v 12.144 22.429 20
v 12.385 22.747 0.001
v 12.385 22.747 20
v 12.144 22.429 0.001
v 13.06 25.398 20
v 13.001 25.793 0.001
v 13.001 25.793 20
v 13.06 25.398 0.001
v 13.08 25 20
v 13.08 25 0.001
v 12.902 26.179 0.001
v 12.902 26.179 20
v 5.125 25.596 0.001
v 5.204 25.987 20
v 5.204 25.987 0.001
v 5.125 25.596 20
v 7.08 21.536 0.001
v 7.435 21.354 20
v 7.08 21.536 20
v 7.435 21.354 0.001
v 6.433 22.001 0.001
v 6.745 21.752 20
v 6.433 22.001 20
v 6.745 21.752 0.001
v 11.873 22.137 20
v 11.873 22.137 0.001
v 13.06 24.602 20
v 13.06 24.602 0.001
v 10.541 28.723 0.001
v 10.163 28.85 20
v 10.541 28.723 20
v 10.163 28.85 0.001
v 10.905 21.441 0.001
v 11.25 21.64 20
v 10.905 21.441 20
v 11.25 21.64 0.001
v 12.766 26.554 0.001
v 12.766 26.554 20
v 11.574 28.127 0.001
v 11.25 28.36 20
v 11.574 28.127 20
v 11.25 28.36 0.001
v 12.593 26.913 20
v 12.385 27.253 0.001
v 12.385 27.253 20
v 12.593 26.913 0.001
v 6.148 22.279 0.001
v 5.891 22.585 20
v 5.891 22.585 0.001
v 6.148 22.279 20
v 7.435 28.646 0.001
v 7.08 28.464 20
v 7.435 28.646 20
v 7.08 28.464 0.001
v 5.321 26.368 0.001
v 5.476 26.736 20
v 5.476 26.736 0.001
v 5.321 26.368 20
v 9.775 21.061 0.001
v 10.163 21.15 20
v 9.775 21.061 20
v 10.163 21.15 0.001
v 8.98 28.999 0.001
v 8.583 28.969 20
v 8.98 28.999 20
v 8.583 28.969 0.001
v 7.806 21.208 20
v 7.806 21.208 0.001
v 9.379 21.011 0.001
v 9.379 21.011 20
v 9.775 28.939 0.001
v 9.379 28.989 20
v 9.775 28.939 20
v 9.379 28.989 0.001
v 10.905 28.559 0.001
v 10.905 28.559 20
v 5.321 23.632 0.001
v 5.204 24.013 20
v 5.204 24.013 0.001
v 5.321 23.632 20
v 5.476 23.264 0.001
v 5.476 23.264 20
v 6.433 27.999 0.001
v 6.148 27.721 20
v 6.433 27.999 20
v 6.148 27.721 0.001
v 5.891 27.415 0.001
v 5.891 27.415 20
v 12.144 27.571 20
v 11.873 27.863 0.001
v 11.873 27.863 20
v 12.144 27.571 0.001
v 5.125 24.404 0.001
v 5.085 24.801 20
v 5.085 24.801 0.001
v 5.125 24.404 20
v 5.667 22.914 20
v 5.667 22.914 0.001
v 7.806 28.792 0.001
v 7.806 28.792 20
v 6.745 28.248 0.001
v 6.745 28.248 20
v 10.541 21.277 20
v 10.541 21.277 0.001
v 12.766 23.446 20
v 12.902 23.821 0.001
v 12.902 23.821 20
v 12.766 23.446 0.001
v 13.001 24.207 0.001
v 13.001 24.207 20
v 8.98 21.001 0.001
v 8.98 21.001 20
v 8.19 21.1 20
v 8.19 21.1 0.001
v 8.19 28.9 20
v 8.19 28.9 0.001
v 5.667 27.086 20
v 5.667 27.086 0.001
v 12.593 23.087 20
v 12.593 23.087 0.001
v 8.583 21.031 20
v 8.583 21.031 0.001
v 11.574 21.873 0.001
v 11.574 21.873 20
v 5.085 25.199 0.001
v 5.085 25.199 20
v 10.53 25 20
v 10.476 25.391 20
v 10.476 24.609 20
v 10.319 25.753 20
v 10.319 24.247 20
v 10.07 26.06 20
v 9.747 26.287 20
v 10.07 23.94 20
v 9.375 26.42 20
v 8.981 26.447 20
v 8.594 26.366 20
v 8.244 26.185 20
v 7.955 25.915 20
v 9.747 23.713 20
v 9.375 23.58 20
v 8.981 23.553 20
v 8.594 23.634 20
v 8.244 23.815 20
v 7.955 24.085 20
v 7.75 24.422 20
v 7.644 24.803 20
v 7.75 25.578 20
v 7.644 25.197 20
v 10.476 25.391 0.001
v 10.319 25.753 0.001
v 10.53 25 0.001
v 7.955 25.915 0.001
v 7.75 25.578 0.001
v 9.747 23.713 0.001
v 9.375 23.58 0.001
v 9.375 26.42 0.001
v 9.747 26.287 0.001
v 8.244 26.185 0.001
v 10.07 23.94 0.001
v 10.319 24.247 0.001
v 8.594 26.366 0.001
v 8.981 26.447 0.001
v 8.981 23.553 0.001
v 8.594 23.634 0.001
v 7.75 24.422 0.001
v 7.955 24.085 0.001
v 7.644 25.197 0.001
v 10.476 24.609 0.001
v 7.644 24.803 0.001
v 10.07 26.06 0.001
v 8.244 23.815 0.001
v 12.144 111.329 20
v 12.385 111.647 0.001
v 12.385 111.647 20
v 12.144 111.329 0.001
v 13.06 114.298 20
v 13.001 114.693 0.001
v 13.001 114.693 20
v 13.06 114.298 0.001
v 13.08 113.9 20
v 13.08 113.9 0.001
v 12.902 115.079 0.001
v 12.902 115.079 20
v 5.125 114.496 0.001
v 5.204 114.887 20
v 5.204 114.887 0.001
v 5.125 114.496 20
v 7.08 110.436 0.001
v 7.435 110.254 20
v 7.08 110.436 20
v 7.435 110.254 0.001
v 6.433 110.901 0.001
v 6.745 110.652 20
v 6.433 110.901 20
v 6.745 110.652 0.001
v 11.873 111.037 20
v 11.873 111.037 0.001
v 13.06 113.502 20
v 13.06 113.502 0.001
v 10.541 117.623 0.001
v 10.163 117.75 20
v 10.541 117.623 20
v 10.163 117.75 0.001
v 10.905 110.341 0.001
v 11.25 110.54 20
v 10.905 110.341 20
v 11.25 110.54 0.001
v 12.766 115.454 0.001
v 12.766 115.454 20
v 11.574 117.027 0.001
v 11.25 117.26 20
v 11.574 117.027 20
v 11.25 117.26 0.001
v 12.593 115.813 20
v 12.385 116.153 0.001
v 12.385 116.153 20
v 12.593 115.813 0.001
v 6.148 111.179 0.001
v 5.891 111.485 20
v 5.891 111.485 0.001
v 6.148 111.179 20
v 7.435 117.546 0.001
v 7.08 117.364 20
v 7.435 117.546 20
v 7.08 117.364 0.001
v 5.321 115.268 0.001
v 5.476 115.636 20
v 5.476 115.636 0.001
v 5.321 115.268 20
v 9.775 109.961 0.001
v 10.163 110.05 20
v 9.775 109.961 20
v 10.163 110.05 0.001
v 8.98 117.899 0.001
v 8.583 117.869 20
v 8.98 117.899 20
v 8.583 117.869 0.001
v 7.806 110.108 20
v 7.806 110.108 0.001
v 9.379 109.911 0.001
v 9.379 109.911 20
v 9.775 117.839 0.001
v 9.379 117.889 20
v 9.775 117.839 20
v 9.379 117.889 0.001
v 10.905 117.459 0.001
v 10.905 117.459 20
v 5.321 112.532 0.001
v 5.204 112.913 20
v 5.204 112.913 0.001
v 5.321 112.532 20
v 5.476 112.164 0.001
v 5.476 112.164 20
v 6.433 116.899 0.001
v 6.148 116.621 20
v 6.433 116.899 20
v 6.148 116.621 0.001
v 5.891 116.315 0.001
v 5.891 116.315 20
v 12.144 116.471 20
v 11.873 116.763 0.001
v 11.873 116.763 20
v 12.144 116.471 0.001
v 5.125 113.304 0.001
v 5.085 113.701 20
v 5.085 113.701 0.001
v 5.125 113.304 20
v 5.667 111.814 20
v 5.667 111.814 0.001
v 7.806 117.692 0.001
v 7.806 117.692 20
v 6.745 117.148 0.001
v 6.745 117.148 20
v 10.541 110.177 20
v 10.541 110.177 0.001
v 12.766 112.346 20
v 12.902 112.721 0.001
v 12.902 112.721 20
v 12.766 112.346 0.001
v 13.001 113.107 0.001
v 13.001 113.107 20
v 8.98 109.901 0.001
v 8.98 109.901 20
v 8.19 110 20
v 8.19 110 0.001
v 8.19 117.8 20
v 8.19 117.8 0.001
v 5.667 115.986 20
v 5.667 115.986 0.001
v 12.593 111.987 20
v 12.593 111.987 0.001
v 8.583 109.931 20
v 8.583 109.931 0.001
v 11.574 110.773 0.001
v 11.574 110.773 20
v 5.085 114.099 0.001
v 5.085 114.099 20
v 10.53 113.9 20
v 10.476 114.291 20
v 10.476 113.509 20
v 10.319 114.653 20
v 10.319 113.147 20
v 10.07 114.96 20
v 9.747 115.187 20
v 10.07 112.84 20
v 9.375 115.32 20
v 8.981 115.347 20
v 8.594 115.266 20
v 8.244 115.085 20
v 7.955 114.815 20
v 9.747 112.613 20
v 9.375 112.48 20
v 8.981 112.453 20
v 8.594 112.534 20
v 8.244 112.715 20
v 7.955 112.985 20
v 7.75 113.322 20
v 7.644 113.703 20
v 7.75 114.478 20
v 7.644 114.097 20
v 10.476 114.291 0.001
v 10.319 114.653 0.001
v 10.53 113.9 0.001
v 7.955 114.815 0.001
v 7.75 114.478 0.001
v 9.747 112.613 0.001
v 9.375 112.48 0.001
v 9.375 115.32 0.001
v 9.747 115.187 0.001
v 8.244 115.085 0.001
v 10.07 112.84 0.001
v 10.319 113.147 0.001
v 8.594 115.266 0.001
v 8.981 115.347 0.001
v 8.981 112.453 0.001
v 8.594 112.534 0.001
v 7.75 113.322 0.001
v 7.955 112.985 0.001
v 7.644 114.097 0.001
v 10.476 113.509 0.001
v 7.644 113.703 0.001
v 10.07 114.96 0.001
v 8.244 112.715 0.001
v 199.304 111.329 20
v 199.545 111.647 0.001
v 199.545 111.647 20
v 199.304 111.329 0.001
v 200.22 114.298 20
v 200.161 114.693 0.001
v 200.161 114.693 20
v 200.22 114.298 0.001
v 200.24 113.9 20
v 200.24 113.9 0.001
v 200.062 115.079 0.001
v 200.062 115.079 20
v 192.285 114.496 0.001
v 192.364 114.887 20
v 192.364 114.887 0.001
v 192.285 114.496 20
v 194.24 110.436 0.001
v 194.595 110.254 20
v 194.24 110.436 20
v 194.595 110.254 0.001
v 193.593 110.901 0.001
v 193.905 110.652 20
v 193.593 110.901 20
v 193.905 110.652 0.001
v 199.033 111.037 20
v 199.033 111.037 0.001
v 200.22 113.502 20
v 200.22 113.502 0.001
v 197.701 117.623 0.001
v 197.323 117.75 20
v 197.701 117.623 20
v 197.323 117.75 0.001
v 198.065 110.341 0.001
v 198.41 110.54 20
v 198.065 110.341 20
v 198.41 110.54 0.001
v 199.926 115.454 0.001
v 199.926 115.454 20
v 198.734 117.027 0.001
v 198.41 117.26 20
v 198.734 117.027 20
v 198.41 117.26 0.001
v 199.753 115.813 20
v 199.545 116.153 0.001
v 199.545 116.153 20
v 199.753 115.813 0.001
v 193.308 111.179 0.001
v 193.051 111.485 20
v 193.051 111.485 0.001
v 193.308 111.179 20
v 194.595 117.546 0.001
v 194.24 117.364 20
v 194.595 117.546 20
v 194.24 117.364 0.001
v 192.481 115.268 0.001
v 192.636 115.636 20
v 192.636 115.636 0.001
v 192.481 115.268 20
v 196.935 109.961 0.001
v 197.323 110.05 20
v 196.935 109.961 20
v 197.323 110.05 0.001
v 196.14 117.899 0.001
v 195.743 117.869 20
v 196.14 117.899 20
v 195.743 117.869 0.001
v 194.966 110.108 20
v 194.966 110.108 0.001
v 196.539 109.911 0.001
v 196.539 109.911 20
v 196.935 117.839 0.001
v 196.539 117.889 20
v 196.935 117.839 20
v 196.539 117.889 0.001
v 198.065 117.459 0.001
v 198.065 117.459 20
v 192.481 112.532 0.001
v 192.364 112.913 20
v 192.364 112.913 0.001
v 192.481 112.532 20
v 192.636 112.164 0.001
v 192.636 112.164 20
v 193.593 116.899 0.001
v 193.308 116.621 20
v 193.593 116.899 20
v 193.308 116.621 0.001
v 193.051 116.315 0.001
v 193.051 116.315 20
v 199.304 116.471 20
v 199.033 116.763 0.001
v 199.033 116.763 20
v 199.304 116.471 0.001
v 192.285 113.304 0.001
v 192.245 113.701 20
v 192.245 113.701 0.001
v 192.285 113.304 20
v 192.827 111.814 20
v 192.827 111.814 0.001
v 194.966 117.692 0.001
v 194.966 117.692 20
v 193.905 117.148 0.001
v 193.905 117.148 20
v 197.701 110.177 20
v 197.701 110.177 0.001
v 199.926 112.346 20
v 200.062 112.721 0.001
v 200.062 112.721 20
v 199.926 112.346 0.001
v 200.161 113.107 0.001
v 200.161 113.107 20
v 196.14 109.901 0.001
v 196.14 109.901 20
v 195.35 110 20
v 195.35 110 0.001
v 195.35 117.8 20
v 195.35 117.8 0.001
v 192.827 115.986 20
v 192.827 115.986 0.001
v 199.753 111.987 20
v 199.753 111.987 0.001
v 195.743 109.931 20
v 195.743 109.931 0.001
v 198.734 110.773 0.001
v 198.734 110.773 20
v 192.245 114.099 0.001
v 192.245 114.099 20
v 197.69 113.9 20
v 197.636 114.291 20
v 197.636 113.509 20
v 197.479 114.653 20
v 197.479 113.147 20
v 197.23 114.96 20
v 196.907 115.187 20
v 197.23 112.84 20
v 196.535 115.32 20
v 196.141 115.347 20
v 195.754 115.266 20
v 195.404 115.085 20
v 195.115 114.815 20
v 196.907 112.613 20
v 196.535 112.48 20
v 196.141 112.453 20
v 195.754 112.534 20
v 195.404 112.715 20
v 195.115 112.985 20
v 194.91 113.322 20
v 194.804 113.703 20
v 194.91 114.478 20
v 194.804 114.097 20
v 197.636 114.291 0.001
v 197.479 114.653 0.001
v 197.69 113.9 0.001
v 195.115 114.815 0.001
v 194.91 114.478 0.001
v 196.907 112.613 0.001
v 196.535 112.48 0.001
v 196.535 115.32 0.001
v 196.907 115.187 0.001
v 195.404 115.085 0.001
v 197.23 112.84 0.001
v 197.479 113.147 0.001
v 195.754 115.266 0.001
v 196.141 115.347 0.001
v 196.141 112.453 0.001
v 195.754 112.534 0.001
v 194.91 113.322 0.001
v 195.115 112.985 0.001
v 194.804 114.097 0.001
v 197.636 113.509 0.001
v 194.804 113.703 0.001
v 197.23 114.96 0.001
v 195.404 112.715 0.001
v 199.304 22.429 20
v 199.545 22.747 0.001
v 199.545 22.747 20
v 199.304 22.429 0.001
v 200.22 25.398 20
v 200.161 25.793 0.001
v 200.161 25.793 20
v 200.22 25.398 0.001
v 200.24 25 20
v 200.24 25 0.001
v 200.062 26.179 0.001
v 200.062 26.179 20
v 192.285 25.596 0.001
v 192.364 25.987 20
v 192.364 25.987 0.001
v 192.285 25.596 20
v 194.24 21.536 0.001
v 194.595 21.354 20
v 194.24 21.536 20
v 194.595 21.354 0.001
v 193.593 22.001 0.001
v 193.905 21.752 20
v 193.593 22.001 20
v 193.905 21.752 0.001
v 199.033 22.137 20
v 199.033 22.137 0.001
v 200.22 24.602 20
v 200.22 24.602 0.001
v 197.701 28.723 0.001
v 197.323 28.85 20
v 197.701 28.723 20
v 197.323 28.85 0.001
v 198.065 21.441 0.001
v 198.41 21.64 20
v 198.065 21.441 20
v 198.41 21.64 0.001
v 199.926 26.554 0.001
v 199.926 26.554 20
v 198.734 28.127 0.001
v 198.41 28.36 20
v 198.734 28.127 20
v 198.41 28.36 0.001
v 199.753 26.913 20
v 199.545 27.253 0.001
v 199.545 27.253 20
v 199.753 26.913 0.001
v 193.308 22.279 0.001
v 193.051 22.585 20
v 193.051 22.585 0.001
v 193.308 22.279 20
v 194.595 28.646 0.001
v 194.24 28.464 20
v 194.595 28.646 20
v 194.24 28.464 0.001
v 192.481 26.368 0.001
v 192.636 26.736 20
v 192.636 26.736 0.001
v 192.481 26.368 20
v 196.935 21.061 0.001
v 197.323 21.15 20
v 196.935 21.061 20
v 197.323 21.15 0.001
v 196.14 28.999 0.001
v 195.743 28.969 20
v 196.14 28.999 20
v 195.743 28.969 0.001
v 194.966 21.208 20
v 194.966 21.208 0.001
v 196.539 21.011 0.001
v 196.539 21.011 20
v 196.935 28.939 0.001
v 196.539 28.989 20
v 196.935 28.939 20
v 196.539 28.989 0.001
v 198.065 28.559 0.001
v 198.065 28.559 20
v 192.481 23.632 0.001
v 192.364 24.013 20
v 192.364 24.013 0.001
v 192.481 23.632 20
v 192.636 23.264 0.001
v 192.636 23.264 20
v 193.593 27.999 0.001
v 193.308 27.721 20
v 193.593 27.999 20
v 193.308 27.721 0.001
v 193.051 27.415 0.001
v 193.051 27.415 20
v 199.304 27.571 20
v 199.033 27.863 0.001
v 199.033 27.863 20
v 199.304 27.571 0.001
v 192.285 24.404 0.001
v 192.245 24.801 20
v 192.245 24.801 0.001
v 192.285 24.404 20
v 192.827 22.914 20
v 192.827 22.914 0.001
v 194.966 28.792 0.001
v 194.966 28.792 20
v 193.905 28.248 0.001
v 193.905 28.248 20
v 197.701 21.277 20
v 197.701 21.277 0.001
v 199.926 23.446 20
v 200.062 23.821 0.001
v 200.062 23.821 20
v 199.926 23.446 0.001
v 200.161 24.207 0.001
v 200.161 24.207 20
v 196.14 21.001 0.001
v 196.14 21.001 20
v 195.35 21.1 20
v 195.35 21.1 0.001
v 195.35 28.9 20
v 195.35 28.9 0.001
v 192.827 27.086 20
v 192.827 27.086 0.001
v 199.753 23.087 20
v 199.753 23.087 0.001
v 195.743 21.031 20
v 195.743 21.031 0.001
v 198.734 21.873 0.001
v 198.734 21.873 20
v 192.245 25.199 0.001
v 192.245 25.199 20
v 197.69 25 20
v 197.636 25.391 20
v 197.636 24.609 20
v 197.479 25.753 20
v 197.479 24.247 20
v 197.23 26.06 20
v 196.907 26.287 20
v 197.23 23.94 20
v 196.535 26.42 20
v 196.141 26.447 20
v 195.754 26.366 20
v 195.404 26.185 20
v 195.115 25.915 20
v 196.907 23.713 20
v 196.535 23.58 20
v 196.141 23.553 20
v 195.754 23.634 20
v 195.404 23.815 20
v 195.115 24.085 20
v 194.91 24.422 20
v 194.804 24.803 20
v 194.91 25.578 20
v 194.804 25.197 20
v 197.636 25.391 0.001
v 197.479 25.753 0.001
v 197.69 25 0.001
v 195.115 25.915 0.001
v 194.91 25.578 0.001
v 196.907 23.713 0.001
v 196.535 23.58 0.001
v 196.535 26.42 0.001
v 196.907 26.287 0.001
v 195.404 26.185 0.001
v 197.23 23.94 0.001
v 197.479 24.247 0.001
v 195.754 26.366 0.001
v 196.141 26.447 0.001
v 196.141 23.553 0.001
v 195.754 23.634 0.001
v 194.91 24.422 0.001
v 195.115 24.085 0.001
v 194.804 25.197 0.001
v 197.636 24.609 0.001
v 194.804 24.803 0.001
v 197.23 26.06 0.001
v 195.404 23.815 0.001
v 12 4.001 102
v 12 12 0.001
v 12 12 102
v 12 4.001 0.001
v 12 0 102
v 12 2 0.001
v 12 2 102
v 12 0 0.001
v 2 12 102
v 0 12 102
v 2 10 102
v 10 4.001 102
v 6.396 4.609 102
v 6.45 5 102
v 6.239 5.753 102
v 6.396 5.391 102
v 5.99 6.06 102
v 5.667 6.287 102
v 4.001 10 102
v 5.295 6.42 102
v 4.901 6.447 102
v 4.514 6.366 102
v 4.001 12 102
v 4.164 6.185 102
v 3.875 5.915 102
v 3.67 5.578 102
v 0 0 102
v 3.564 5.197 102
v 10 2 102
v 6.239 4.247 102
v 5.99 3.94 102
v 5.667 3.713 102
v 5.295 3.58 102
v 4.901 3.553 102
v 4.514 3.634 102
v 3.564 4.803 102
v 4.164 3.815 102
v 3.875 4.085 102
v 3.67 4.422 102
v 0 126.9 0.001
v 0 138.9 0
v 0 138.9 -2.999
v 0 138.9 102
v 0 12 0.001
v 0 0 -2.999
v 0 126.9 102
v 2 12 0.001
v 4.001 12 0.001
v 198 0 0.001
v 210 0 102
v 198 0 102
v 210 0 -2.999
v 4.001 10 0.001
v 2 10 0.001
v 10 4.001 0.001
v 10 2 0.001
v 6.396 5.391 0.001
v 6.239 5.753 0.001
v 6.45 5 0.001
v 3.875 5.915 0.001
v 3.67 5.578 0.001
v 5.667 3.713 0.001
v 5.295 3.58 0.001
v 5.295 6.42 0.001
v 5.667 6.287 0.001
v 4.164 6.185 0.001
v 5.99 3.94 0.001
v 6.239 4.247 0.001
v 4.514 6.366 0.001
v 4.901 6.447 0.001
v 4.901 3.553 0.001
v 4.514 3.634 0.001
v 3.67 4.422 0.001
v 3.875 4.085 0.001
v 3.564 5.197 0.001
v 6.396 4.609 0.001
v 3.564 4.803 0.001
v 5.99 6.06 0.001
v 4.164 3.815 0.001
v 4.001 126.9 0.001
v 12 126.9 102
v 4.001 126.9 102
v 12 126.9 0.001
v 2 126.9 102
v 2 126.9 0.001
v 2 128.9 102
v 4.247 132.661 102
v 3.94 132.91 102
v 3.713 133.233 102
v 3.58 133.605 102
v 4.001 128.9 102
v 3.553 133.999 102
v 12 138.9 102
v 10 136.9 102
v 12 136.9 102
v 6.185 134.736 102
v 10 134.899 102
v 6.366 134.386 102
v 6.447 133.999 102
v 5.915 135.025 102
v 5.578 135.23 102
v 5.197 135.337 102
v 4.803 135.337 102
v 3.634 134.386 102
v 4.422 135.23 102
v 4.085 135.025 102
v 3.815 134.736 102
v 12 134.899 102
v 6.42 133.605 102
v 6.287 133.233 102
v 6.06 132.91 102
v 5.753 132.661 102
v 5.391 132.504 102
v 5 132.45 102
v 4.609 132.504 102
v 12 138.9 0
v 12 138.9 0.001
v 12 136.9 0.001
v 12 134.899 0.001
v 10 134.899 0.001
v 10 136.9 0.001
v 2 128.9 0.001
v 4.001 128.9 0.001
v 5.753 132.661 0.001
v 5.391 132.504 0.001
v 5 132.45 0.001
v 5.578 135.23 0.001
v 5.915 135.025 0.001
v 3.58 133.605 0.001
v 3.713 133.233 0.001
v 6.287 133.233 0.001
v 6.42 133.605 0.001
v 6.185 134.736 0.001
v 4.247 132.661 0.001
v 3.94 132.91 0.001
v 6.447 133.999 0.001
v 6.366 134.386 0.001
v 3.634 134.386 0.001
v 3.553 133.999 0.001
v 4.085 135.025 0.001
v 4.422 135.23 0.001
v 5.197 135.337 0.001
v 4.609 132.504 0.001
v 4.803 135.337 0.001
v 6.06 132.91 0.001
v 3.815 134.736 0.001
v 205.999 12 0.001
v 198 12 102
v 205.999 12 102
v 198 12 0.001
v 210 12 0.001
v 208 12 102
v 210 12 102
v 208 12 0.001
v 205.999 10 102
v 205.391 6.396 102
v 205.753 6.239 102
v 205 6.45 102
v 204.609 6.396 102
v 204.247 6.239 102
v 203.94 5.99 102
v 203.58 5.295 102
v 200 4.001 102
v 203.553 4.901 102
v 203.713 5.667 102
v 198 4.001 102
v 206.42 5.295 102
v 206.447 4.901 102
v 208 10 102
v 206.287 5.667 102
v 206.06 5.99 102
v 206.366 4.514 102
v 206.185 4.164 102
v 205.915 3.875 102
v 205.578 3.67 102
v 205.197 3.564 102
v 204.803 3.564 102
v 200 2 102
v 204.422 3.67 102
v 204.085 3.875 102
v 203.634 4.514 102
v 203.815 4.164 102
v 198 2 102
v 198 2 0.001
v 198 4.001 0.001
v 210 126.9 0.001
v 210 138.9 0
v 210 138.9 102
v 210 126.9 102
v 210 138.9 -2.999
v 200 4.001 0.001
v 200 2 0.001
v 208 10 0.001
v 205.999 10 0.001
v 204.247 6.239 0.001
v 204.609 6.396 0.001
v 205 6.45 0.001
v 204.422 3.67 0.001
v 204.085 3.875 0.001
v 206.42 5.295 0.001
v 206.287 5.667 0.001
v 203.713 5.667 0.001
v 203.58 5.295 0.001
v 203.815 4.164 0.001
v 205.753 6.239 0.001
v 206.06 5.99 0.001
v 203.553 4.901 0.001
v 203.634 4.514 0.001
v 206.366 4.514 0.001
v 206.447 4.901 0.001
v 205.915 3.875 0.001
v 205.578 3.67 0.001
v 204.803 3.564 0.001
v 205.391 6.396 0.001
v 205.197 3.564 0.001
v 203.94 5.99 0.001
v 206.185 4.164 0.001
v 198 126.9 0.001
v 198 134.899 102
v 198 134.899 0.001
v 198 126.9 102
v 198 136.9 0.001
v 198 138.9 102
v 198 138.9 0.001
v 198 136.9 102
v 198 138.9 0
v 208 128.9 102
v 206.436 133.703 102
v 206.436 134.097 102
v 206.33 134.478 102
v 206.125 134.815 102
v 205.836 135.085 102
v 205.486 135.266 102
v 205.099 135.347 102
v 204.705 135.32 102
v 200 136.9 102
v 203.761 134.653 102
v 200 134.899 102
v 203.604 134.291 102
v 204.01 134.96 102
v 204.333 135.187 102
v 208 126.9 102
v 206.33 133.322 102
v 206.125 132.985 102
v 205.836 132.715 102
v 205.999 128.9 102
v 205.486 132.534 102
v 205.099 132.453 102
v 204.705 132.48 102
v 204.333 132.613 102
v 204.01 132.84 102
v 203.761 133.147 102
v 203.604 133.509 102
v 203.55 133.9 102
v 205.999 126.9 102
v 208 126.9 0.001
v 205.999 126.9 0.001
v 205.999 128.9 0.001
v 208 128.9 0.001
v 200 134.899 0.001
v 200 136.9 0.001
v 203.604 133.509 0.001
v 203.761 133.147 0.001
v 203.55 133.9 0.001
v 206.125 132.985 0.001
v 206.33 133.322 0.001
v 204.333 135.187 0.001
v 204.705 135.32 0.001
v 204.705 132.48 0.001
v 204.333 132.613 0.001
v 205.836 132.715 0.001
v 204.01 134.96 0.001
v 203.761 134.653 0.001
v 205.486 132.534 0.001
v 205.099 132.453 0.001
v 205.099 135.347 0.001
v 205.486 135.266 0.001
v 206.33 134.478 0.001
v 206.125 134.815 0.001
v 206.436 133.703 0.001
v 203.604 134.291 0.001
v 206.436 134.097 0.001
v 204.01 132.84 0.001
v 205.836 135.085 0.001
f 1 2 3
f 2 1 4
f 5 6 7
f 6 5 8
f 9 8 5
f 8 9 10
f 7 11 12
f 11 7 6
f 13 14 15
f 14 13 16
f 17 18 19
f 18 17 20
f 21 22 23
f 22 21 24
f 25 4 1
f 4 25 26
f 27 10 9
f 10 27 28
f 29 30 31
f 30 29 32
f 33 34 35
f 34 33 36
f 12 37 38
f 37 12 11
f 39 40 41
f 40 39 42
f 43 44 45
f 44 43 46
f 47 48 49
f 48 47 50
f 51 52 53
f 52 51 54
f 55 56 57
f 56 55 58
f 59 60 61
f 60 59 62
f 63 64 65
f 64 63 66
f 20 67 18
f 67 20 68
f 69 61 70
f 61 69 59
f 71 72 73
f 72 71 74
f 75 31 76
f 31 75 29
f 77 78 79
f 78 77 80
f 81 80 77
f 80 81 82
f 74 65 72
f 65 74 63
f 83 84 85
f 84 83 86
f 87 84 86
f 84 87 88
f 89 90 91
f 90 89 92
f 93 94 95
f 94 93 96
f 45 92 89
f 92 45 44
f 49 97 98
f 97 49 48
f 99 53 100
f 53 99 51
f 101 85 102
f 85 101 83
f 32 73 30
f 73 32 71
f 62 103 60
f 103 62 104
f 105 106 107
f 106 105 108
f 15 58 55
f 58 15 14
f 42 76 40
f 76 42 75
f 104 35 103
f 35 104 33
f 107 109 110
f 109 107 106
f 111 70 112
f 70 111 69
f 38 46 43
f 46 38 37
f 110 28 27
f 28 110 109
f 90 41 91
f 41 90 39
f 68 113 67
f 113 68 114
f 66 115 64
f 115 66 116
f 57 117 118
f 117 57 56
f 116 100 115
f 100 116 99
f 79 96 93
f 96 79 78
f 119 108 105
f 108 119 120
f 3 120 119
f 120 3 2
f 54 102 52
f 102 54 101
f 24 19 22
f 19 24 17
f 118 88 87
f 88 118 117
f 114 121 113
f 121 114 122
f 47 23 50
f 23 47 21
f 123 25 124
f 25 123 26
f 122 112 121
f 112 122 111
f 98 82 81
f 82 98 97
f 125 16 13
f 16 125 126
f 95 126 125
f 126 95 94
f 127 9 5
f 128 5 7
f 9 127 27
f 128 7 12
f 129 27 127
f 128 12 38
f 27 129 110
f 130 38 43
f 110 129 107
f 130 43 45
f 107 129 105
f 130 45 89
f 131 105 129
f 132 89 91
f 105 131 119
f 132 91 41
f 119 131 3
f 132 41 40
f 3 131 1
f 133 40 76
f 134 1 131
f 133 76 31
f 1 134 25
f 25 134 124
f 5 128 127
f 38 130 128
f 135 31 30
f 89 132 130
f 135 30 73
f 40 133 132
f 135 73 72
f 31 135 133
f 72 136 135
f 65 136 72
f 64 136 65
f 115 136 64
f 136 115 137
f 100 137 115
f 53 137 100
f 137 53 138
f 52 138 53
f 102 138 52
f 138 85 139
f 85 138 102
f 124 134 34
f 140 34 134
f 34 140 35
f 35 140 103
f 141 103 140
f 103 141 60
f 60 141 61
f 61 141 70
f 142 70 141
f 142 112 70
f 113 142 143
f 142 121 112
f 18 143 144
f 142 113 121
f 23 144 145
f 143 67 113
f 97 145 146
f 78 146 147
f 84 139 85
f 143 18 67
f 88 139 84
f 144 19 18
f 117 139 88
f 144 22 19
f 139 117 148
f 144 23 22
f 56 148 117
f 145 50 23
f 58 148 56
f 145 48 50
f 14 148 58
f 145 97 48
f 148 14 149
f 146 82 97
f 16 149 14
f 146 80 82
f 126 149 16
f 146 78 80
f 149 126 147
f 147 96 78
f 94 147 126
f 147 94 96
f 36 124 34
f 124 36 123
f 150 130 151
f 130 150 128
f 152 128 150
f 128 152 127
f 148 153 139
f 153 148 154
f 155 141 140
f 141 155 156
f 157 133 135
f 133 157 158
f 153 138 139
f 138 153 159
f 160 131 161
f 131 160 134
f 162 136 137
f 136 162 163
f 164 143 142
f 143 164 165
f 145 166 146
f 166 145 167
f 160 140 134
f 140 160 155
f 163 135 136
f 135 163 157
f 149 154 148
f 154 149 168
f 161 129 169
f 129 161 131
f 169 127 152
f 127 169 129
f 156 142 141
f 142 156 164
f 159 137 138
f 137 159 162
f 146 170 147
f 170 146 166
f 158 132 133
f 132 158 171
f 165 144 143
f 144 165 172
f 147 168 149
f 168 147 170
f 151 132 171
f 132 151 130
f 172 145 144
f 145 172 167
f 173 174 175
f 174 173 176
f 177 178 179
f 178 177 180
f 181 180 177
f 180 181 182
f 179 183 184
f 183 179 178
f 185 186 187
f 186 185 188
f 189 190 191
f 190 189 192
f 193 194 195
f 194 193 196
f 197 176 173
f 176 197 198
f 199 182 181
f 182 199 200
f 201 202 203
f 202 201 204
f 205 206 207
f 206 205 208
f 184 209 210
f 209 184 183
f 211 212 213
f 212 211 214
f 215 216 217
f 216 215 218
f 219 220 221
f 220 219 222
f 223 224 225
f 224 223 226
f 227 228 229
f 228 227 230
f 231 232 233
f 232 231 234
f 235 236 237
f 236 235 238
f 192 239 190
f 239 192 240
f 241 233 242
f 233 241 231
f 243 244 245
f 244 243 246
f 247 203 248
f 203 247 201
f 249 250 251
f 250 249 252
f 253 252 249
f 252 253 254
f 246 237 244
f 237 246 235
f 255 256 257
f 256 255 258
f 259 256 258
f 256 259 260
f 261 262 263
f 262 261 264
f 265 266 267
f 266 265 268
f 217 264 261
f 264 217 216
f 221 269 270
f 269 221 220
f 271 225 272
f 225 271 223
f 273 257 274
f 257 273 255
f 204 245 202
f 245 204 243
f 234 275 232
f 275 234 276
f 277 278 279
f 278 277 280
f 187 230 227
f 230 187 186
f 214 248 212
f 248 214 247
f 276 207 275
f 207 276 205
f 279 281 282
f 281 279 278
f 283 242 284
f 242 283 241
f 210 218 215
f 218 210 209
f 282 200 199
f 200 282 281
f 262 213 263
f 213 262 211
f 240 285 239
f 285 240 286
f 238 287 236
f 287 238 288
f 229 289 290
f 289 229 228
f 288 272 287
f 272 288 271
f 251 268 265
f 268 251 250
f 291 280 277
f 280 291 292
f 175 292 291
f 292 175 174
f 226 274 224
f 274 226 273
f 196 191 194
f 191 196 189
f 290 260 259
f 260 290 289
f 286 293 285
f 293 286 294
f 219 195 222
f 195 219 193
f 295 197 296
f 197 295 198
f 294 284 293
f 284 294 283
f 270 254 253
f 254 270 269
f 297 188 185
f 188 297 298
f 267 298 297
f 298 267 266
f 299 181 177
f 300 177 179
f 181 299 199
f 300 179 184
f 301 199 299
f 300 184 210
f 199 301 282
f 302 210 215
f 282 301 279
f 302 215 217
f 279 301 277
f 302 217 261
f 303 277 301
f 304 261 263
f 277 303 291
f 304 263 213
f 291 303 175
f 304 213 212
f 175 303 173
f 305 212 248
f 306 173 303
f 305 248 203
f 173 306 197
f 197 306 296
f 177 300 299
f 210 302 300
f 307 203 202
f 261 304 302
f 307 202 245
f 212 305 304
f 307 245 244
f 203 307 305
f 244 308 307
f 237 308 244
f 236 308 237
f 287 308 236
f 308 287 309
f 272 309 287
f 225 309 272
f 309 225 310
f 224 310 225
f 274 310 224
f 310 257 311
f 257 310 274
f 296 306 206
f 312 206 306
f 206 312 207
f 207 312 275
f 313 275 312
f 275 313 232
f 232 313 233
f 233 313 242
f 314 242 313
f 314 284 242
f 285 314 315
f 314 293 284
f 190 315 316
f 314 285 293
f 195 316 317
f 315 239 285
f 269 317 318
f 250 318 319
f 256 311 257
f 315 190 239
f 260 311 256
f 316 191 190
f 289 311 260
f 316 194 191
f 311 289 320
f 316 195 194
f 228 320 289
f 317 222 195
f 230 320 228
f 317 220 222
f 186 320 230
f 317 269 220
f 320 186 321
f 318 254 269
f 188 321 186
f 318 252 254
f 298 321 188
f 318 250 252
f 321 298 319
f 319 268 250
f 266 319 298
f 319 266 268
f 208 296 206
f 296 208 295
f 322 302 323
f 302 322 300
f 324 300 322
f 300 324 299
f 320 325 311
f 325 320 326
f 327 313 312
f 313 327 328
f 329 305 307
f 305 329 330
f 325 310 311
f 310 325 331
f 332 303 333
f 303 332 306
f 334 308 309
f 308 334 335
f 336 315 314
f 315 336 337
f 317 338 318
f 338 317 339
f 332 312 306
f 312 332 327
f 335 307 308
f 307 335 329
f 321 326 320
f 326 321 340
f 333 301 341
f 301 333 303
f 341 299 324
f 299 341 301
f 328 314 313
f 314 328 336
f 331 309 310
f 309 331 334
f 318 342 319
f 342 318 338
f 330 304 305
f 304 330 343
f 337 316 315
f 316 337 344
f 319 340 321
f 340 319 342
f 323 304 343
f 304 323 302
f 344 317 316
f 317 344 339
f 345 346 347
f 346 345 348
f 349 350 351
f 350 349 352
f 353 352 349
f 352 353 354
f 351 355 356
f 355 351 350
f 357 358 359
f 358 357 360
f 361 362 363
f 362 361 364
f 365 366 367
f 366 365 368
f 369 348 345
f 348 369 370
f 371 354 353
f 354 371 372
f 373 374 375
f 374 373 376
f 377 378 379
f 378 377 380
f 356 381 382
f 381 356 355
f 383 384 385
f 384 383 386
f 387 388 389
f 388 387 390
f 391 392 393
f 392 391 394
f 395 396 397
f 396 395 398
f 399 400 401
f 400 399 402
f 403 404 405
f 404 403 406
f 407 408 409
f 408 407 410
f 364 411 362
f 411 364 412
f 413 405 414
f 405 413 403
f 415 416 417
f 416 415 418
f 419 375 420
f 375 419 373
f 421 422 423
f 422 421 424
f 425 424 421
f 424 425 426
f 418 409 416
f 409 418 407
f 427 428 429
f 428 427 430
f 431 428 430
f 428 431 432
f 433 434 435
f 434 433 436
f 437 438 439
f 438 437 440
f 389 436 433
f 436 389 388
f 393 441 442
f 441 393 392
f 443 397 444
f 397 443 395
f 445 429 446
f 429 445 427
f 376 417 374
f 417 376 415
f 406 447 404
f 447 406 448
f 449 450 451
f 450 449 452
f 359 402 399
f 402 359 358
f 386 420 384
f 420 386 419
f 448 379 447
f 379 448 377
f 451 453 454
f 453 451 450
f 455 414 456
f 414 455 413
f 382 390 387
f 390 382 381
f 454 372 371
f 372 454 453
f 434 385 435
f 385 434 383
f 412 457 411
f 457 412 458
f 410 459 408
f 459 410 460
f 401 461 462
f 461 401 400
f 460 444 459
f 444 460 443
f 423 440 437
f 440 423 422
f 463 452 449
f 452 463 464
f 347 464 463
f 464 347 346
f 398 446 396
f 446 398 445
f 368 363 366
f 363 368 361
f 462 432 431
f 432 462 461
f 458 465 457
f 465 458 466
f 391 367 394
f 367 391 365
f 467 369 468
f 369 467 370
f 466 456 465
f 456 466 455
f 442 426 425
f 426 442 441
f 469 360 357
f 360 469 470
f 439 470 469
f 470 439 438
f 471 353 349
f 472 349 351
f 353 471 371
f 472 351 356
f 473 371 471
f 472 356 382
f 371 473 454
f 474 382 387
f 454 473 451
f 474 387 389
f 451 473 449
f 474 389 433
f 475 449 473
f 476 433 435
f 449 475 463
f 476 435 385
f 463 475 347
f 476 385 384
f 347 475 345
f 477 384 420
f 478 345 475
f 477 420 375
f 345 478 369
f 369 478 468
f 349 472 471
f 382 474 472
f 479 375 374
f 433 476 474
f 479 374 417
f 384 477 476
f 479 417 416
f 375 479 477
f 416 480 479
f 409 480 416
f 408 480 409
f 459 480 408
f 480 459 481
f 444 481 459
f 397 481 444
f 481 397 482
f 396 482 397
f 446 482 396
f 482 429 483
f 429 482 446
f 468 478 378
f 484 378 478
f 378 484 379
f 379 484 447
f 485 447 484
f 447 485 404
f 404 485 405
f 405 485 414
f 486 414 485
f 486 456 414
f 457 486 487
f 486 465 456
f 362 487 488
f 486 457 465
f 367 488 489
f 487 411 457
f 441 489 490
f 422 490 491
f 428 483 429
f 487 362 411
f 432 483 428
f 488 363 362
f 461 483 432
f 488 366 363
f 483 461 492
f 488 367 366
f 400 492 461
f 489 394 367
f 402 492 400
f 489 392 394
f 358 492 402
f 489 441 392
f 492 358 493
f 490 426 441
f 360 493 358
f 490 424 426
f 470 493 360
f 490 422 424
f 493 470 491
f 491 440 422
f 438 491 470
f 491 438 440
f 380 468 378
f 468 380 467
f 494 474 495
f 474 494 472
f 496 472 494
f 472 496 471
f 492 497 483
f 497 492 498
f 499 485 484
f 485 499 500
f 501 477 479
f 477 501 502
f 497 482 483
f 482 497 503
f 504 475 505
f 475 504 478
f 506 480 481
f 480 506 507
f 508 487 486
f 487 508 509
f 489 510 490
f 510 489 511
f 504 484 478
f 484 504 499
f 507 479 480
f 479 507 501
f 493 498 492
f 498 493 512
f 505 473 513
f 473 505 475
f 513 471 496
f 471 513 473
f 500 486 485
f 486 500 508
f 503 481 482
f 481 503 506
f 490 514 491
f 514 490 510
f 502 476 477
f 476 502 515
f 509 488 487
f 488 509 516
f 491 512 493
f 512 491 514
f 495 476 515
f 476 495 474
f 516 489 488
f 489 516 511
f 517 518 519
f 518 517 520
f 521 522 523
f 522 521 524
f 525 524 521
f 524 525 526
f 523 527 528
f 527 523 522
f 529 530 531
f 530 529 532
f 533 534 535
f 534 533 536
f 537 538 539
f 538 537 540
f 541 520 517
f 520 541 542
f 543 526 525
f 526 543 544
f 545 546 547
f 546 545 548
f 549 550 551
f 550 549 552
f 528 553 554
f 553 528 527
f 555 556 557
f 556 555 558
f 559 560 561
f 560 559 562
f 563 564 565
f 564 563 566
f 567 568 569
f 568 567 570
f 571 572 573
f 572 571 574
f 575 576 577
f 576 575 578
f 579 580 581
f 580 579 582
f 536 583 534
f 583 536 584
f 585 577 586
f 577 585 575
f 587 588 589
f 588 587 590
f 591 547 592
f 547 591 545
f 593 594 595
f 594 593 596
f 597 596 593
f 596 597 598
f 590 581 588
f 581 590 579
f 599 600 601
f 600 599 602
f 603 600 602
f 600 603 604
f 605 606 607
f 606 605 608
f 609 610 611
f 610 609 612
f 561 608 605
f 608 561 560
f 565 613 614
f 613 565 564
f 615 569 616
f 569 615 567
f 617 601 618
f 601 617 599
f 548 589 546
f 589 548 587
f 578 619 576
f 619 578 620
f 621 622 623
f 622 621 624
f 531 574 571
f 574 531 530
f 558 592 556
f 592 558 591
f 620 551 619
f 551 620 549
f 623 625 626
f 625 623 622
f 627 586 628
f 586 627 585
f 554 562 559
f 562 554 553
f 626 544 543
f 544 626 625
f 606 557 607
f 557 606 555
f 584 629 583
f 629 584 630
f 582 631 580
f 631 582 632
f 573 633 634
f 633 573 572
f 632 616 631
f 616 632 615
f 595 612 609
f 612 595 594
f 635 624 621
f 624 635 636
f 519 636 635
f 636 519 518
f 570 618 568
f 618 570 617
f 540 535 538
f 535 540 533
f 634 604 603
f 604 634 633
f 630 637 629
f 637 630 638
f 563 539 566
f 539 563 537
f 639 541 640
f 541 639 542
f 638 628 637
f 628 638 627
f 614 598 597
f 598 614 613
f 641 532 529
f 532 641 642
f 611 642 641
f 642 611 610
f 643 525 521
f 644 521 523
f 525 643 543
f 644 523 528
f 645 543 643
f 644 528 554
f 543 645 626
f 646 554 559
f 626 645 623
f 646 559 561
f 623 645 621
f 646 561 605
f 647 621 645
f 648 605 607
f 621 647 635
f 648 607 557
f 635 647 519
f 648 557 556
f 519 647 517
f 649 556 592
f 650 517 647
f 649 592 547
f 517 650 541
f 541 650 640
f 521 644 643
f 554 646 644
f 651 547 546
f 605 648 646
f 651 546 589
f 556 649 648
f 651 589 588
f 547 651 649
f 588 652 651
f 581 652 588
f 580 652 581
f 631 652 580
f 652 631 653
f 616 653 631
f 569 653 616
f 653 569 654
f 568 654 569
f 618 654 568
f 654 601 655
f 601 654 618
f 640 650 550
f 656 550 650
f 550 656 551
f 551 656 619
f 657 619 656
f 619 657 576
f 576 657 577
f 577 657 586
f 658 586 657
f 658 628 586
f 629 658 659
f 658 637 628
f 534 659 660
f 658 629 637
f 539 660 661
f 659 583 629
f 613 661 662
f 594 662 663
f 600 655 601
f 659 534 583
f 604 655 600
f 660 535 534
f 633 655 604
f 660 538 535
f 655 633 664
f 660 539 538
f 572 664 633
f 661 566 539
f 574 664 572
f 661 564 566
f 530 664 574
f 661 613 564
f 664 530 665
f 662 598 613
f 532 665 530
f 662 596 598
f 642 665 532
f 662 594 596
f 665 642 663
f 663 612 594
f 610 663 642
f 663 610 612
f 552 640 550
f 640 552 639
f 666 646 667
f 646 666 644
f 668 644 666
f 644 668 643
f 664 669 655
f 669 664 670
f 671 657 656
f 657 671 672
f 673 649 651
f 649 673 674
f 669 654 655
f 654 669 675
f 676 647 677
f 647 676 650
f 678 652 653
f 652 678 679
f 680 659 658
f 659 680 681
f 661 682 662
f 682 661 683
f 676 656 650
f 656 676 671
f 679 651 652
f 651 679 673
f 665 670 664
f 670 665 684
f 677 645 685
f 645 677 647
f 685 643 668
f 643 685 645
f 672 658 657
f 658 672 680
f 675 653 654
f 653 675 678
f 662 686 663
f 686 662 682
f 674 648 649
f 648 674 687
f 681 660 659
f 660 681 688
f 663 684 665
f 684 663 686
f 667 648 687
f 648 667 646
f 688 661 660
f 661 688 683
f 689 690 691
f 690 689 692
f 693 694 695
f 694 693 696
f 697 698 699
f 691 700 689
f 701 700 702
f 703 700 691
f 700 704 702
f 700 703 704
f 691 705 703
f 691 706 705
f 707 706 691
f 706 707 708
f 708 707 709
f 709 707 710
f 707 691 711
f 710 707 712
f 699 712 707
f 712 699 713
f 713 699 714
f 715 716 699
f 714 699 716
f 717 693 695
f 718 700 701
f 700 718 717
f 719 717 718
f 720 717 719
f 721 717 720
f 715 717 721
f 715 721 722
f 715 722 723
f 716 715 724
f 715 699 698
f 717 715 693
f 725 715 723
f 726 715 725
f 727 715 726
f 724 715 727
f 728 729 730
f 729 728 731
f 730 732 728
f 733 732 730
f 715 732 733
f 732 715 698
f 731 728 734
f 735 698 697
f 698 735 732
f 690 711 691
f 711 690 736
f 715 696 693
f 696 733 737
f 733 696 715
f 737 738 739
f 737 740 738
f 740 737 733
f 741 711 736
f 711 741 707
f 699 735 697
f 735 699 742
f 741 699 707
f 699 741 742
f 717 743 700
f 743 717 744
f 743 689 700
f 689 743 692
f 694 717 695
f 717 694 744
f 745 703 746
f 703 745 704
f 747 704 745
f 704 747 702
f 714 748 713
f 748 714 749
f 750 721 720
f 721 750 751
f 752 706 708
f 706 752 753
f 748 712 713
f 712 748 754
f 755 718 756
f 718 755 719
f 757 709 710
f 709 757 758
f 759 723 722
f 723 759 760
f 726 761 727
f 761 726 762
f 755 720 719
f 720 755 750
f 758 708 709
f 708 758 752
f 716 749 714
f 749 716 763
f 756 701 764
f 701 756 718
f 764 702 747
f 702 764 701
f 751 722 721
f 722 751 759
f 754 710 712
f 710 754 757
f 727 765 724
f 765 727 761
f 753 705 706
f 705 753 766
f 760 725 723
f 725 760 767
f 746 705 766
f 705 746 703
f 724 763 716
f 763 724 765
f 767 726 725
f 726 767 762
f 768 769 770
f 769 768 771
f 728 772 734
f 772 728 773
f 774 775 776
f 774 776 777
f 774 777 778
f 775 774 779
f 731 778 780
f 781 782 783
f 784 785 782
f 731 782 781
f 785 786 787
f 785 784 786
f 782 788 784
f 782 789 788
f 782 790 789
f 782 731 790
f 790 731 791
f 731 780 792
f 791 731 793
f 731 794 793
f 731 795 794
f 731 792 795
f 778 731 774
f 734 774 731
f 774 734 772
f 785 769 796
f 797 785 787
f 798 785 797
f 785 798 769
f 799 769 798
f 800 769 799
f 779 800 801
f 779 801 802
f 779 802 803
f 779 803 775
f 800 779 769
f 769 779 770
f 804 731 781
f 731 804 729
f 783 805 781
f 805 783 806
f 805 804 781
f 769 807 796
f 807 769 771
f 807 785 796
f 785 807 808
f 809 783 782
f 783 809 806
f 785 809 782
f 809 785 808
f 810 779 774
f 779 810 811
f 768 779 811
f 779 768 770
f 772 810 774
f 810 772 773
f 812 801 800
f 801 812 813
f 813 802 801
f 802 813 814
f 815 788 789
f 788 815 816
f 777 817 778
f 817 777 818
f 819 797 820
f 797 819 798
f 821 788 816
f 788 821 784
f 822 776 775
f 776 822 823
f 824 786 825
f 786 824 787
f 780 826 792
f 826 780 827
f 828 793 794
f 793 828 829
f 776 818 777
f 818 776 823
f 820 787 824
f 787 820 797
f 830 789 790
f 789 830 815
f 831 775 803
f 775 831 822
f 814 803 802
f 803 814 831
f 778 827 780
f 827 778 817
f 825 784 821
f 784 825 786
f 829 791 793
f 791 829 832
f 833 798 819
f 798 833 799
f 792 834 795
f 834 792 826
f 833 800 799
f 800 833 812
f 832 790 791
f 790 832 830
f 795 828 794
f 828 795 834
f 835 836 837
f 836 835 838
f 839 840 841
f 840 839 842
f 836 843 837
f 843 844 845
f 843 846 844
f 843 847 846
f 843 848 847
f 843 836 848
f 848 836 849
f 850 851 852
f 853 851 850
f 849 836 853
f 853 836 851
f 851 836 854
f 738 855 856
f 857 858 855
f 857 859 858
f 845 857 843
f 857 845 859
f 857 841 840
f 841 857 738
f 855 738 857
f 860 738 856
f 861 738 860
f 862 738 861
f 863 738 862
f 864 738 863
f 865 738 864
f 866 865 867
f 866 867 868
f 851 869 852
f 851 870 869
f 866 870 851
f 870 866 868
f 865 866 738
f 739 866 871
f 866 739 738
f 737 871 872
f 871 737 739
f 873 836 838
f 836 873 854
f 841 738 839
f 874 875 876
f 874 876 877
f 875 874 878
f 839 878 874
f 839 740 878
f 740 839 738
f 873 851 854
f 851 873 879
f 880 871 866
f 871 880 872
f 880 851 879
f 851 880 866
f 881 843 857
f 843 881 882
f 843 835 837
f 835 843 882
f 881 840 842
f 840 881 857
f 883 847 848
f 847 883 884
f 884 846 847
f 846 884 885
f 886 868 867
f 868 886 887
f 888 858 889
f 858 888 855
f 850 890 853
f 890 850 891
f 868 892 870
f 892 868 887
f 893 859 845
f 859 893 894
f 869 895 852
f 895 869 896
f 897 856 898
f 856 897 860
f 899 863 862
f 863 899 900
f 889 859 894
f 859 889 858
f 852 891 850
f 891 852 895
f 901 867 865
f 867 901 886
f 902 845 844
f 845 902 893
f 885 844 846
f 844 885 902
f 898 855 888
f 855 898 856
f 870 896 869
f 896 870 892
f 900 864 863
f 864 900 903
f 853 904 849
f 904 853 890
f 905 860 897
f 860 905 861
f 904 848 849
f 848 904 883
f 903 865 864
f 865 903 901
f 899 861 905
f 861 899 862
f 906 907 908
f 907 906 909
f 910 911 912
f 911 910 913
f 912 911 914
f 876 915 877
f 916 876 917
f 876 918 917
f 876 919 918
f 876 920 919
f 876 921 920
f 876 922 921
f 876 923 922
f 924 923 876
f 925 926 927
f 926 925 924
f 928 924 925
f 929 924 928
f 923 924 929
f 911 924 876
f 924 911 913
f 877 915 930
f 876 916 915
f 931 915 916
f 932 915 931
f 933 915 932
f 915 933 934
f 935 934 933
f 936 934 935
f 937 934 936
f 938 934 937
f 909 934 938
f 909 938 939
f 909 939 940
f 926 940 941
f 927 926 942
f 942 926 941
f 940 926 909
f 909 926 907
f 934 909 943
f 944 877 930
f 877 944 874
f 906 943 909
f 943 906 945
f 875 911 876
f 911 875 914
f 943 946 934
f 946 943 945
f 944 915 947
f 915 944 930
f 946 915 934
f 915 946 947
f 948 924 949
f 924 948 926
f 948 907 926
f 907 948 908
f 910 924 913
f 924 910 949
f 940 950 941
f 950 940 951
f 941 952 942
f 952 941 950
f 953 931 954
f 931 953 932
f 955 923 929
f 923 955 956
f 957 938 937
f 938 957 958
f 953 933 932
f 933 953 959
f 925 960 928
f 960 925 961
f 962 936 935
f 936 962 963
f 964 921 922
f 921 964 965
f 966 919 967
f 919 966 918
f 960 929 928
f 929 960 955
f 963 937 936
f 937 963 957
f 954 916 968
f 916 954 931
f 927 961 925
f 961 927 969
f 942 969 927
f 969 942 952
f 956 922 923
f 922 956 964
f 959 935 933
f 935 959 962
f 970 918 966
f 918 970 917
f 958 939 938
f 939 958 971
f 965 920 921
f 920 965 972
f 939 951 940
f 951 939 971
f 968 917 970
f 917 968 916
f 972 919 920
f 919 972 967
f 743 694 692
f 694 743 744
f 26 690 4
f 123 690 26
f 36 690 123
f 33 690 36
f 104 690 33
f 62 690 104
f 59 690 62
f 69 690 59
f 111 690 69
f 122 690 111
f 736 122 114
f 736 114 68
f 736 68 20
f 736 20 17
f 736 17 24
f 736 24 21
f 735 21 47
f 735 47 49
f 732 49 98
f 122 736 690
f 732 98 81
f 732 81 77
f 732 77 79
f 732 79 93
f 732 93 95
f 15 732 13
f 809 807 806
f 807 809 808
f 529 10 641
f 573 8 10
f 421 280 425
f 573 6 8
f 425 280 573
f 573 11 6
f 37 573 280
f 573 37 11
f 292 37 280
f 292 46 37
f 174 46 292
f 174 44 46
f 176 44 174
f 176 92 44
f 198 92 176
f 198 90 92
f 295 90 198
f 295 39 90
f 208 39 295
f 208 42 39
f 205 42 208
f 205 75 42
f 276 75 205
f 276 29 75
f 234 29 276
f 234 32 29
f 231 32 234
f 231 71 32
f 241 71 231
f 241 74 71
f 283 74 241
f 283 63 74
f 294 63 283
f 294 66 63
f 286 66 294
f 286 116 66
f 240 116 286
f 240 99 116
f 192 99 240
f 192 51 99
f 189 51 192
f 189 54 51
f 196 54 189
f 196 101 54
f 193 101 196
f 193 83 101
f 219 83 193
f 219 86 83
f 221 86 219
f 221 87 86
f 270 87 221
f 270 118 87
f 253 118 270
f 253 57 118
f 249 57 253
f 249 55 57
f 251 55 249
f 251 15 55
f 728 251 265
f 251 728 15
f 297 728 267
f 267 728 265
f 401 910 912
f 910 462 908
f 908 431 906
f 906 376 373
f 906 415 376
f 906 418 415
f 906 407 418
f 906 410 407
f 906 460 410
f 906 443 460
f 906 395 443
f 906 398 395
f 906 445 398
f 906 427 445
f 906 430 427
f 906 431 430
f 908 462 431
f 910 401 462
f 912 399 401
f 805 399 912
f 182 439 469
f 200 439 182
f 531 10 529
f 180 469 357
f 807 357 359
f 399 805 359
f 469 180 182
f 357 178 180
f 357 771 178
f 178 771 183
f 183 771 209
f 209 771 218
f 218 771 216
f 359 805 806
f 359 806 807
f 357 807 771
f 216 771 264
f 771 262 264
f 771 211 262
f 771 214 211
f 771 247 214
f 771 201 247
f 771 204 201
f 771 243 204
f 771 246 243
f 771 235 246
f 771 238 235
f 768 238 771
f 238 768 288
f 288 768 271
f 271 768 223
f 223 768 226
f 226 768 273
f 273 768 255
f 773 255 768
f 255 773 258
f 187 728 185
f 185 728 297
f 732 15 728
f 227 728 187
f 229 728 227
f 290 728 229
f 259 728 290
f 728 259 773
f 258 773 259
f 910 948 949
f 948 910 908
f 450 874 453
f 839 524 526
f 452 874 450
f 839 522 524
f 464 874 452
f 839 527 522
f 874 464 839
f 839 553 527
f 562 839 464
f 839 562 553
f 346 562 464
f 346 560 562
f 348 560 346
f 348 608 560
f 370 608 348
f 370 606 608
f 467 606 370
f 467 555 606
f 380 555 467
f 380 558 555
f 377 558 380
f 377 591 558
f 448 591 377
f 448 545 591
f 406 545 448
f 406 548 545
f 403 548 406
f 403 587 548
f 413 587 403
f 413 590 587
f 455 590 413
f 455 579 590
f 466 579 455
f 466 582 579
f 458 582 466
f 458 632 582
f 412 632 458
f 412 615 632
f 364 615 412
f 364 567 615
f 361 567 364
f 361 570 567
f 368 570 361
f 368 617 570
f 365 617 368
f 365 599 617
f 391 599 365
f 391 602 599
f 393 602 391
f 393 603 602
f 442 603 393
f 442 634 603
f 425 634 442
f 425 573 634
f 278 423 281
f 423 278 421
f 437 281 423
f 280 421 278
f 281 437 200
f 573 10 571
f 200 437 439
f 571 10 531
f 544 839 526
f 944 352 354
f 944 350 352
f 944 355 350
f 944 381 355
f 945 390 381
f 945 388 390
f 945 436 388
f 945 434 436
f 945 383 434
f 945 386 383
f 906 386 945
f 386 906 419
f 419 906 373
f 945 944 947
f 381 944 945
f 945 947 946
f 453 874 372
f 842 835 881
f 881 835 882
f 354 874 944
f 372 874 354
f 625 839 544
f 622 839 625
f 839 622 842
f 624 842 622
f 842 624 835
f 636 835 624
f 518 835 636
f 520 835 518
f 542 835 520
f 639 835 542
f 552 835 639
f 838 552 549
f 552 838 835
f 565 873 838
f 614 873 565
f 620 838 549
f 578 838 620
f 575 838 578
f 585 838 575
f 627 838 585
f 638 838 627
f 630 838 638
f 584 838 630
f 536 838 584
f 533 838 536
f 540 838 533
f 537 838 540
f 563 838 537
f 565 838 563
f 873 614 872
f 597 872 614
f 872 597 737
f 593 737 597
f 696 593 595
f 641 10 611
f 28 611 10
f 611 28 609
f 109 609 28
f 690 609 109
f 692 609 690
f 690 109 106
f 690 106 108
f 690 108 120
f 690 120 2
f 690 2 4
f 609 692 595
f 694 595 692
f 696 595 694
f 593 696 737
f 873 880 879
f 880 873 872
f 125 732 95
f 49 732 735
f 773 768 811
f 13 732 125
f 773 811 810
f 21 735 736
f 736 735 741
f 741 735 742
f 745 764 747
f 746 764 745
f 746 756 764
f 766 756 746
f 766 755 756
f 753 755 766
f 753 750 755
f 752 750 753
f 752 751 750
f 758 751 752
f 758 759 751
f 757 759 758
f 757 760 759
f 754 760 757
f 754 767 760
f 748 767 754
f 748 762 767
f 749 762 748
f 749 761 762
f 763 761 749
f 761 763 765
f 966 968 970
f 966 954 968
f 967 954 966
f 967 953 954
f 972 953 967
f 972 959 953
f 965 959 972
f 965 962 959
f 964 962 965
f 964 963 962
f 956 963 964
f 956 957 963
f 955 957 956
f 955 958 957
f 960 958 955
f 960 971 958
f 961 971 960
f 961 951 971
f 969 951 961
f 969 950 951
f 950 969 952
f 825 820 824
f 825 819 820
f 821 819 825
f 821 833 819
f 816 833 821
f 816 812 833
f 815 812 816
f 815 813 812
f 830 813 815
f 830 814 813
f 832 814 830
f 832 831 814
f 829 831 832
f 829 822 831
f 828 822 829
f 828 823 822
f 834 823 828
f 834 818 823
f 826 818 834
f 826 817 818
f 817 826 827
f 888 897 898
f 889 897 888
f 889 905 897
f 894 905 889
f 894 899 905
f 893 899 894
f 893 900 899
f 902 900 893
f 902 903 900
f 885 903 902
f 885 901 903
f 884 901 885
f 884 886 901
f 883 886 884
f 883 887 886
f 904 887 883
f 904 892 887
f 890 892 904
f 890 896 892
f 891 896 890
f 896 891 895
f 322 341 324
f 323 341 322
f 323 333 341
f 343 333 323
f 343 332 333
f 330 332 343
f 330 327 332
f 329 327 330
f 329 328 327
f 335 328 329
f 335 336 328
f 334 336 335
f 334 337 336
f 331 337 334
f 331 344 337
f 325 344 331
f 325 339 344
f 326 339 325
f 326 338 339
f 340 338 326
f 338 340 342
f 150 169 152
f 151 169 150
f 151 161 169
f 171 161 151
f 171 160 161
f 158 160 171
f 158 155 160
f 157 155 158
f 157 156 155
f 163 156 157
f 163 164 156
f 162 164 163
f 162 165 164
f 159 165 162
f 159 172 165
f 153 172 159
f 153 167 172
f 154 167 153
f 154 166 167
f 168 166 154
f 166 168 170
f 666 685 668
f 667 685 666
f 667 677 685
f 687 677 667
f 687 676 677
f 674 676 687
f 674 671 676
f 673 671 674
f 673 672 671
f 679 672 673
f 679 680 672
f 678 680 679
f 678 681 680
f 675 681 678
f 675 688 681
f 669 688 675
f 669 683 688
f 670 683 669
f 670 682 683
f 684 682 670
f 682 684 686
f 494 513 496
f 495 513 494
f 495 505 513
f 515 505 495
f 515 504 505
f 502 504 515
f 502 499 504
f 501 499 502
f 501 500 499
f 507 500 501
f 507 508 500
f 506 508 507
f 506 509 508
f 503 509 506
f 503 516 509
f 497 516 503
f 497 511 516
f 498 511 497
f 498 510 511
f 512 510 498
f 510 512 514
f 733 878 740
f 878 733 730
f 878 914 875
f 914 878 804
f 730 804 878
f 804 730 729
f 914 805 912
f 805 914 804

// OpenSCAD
$fa = 1;
$fs = 0.4;

esp = 3.0;
d = 0.001;
W = 88.9;
l = 5.08;
H = 102.0;
LL = 187.16;
Lmax=210;

union(){
    translate([0,0,-3+d])
        cube([Lmax, W+50,3]);
    
    translate([2+2+l,25,0])
    difference(){
        cylinder(h=20, r=4);
        cylinder(h=20+2*d, r=2.9/2);
    }
translate([2+2+l,25+W,0])
    difference(){
        cylinder(h=20, r=4);
        cylinder(h=20+2*d, r=2.9/2);
    }
translate([2+2+l+LL,25+W,0])
    difference(){
        cylinder(h=20, r=4);
        cylinder(h=20+2*d, r=2.9/2);
    }

translate([2+2+l+LL,25, 0])
    difference(){
        cylinder(h=20, r=4);
        cylinder(h=20+2*d, r=2.9/2);
    }
        
difference(){
    cube([12,12,H]);
    translate([2, 10, -d])
        cube([2+d, 2+d, H+2*d]);
    translate([10, 2, -d])
        cube([2+d, 2+d, H+2*d]);
    translate([5,5,-d])
        cylinder(h=H+2*d, r=2.9/2);
    
}

translate([0,W+50,0])
rotate([0,0,-90])
difference(){
    cube([12,12,H]);
    translate([2, 10, -d]){
        cube([2+d, 2+d, H+2*d]);
    }
translate([10, 2, -d]){
        cube([2+d, 2+d, H+2*d]);
    }
        
    translate([5,5,-d]){
        cylinder(h=H+2*d, r=2.9/2);
    }
}


translate([Lmax,0,0])
rotate([0,0,90])
difference(){
    cube([12,12,H]);
    translate([2, 10, -d]){
        cube([2+d, 2+d, H+2*d]);
    }
translate([10, 2, -d]){
        cube([2+d, 2+d, H+2*d]);
    }
        
    translate([5,5,-d]){
        cylinder(h=H+2*d, r=2.9/2);
    }
}

translate([Lmax,W+50,0])
rotate([0,0,180])
difference(){
    cube([12,12,H]);
    translate([2, 10, -d]){
        cube([2+d, 2+d, H+2*d]);
    }
translate([10, 2, -d]){
        cube([2+d, 2+d, H+2*d]);
    }
        
    translate([5,5,-d]){
        cylinder(h=H+2*d, r=2.9/2);
    }
}



}
